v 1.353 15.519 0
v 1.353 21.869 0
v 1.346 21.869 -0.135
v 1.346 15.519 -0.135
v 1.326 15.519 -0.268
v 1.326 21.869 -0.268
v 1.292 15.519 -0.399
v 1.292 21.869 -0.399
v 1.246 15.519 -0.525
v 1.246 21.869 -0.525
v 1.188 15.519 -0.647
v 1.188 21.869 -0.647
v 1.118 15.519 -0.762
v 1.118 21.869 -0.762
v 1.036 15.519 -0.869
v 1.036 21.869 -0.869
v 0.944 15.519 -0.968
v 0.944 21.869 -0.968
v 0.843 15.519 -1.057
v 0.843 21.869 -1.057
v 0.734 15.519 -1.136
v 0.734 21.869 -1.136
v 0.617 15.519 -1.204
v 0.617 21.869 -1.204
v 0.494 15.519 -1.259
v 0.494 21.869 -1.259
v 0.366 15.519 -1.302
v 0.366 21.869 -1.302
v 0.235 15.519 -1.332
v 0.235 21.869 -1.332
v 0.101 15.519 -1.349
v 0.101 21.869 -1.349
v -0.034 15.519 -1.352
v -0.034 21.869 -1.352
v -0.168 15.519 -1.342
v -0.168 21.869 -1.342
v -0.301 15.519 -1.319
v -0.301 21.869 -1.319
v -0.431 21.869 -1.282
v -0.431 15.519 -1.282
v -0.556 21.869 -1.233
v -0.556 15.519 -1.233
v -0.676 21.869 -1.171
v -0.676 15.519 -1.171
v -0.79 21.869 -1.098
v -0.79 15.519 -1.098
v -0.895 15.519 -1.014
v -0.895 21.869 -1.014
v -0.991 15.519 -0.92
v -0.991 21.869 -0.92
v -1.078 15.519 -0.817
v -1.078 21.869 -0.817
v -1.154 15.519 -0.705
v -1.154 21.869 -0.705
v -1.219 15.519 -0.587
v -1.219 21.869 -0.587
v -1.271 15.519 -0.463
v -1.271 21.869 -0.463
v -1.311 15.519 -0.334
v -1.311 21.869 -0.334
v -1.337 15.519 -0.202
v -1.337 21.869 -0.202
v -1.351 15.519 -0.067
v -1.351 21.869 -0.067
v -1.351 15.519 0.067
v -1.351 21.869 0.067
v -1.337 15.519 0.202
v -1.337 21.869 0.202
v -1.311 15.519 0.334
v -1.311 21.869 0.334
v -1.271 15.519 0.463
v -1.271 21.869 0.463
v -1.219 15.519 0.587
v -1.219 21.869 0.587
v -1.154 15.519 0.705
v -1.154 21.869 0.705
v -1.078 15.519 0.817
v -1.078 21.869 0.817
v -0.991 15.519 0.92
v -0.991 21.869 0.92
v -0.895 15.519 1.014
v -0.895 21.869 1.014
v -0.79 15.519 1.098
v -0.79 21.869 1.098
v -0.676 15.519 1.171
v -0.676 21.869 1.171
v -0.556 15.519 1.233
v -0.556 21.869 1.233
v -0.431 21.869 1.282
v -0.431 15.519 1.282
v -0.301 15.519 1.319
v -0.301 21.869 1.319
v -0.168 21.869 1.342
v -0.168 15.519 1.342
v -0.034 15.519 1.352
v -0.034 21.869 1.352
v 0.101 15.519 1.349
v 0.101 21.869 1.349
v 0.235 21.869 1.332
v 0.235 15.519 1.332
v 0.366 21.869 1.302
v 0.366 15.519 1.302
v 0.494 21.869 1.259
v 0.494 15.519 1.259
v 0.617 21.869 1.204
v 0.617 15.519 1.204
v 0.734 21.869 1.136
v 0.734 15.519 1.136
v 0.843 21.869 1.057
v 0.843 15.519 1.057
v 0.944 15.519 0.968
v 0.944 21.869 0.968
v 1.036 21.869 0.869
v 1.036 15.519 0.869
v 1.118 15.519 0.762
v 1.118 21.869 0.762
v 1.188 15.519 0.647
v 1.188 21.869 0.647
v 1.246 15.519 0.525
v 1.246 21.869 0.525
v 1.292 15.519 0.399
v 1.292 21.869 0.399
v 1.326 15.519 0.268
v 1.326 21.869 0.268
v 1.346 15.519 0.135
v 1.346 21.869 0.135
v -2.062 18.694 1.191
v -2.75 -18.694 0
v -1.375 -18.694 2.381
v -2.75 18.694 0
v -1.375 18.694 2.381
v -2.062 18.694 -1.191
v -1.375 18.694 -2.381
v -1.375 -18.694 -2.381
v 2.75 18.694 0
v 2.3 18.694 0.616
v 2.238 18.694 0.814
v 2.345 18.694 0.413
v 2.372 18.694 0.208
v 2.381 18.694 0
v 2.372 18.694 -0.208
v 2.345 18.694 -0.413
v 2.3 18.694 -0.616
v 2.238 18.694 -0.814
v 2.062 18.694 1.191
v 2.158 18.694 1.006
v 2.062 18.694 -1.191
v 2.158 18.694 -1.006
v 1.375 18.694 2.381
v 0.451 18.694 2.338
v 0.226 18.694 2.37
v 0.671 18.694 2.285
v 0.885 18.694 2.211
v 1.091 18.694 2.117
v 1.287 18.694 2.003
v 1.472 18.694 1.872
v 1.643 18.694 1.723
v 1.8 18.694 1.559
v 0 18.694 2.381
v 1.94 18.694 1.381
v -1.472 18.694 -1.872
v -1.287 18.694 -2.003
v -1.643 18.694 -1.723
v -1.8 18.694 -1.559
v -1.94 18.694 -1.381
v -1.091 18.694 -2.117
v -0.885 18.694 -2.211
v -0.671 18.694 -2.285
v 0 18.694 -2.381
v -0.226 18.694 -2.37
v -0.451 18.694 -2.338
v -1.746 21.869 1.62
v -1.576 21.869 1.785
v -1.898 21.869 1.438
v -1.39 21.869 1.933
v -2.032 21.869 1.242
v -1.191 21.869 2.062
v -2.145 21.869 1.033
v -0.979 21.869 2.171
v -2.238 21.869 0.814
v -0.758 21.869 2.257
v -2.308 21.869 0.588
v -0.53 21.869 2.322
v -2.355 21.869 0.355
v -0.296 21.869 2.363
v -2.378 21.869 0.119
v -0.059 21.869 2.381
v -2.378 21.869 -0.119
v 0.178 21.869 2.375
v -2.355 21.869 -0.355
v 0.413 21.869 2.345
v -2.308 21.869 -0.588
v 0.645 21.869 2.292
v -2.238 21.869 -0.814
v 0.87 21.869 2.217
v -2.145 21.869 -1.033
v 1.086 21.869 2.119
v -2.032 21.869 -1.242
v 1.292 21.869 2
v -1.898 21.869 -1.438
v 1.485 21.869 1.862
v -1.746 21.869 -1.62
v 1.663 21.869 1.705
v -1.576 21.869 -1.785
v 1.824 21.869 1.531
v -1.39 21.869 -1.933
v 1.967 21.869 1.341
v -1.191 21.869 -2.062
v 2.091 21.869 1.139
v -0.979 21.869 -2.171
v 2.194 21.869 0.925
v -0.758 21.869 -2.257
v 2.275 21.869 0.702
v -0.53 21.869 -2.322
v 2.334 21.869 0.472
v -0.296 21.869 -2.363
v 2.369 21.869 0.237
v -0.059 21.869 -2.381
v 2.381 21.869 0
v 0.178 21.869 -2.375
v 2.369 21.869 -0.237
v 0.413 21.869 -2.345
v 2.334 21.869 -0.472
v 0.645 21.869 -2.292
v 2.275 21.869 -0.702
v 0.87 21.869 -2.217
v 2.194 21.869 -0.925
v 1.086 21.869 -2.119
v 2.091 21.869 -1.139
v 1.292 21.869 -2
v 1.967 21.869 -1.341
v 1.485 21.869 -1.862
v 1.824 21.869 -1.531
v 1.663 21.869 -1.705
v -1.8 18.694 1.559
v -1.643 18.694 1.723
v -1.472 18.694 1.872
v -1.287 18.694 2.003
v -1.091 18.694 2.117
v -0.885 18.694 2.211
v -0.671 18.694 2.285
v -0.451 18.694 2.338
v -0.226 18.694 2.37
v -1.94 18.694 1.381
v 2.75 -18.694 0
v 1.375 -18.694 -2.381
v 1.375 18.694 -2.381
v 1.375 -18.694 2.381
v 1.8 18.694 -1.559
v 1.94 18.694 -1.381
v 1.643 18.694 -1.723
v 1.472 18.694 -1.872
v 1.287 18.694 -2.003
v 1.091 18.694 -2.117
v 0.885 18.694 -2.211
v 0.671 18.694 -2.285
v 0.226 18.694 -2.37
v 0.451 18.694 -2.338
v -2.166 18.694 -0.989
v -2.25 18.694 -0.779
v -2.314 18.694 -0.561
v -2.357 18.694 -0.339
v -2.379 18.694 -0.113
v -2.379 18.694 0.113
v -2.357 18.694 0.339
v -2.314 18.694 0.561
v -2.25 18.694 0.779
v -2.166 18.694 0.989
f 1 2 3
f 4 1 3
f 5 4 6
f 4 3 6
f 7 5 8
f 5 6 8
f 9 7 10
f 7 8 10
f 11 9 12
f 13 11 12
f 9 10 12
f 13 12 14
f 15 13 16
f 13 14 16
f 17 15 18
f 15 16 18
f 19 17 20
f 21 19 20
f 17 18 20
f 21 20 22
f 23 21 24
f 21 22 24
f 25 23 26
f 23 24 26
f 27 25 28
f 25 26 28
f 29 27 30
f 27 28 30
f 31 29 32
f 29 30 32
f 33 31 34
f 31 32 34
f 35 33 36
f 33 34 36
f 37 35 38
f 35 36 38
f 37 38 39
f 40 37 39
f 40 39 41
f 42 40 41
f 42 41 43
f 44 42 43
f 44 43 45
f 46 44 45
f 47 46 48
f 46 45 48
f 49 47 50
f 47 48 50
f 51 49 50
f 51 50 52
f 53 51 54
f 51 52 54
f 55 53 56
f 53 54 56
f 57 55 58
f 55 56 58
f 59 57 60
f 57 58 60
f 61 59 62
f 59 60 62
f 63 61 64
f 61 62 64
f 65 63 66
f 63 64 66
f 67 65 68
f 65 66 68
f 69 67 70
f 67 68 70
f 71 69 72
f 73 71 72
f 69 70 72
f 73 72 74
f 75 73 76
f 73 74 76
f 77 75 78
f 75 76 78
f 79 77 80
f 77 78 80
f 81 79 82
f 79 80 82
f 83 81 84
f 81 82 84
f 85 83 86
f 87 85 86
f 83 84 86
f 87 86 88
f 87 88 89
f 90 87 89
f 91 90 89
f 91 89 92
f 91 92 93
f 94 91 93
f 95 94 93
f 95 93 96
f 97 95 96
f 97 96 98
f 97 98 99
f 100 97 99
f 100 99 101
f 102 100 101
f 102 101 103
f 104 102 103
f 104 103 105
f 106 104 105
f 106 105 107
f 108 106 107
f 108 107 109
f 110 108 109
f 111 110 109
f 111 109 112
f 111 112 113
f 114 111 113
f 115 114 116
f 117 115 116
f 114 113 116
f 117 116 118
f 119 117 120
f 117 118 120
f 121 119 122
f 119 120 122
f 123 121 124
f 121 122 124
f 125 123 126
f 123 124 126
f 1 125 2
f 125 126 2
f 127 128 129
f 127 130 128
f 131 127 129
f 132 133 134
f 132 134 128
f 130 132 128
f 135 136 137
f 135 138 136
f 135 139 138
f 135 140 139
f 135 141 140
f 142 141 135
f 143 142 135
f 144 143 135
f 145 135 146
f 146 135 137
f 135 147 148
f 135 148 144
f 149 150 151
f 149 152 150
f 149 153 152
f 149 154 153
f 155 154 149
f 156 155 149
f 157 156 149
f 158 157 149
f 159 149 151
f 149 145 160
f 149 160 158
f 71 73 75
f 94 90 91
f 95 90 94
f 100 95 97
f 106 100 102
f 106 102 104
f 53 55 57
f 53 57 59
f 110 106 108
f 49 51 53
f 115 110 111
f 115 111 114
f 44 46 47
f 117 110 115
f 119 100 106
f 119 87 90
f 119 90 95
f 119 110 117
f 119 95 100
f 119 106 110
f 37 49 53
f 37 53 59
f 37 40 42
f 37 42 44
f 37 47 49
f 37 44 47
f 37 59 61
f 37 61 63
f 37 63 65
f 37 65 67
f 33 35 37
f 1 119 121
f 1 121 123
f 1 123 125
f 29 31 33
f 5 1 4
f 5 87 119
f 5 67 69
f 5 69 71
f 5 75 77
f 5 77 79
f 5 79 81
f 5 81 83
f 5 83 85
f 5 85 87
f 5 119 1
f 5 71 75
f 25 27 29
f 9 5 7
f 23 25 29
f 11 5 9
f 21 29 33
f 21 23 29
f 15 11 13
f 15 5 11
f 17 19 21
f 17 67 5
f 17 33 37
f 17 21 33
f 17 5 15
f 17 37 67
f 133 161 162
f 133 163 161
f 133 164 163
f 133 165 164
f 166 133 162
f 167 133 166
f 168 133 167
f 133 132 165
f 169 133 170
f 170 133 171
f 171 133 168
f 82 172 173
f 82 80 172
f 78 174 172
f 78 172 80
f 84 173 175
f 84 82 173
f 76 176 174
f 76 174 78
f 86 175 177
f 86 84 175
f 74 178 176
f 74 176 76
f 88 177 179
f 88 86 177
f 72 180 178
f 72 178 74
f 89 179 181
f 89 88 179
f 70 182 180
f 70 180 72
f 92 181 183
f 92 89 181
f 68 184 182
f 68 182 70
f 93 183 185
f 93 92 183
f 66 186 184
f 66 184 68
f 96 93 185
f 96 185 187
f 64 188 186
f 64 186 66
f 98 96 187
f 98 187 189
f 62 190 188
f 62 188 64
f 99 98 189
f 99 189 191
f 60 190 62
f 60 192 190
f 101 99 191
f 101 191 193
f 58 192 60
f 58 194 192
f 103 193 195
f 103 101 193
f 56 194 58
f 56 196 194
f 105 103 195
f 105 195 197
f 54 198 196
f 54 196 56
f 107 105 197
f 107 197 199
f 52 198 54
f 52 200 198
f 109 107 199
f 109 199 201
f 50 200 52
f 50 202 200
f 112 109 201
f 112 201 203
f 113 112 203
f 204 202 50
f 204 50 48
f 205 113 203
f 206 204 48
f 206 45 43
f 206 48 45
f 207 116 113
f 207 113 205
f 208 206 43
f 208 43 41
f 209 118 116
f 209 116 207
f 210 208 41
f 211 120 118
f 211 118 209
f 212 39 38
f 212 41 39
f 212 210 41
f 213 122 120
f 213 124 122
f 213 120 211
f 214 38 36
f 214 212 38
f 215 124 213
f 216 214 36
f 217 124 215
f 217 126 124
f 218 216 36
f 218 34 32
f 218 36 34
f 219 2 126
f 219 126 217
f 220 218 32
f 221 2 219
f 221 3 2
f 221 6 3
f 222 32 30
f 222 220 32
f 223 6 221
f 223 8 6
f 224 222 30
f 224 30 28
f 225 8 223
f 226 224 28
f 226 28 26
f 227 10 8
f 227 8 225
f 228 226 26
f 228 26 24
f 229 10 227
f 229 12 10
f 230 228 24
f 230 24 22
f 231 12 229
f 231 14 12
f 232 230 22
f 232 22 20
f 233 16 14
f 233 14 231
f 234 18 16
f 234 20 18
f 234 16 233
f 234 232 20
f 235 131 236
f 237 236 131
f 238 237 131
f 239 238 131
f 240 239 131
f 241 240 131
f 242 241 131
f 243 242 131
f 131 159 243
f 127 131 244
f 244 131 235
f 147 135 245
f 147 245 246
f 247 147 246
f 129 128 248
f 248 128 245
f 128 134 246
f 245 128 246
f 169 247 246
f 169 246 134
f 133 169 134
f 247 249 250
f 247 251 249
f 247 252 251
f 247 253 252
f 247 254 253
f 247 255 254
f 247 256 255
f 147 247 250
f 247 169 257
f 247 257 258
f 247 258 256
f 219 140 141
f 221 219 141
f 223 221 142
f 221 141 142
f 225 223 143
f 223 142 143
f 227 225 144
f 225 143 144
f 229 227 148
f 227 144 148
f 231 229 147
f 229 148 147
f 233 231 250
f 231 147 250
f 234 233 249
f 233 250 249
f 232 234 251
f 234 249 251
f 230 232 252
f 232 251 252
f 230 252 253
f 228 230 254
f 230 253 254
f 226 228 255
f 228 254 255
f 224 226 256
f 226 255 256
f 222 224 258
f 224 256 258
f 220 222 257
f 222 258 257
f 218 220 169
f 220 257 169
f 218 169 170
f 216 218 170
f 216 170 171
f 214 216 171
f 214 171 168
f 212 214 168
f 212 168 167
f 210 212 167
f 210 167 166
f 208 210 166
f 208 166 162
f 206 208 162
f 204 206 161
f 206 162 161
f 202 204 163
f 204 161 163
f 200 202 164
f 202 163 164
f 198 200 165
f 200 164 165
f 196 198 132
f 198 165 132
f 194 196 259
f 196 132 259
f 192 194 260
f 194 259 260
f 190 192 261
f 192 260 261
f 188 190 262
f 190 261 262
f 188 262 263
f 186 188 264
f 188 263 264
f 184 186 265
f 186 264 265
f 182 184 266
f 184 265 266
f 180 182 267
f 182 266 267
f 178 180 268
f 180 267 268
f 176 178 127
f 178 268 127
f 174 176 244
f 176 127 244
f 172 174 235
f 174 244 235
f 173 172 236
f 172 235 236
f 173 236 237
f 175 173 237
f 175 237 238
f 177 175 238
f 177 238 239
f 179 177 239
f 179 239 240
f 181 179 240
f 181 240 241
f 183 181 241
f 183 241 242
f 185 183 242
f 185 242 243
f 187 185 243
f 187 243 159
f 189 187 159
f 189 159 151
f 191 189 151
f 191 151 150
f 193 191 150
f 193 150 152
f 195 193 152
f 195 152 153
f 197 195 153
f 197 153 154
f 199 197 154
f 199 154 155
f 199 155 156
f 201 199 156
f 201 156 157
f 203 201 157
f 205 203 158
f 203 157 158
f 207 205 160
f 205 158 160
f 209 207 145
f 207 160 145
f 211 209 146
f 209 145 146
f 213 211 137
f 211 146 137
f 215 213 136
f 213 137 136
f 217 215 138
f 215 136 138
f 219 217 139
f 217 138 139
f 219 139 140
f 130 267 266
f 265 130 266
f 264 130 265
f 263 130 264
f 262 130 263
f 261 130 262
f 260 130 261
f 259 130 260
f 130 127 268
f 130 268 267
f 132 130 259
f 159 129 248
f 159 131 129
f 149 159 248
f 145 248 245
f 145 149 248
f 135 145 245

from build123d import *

# Parameters (mm, degrees)
BOSS_EXTRUDE1_DEPTH = 18.6944
SKETCH2_R           = 2.38125
BOSS_EXTRUDE2_DEPTH = 3.175
SKETCH3_R           = 1.35255
CUT_EXTRUDE1_DEPTH  = 6.35


with BuildPart() as part:
    # Sketch1 → Boss-Extrude1 (new body, symmetric)
    with BuildSketch(Plane(origin=(0, 0, 0), x_dir=(1, 0, 0), z_dir=(0, 1, 0))):
        Polygon((1.374815329, -2.38125), (2.749630657, 0), (1.374815329, 2.38125), (-1.374815329, 2.38125), (-2.749630657, 0), (-1.374815329, -2.38125), align=None)
    extrude(amount=BOSS_EXTRUDE1_DEPTH, both=True)

    # Sketch2 → Boss-Extrude2 (add)
    with BuildSketch(Plane(origin=(0, 18.6944, 0), x_dir=(1, 0, 0), z_dir=(0, 1, 0))):
        Circle(SKETCH2_R)
    extrude(amount=BOSS_EXTRUDE2_DEPTH)

    # Sketch3 → Cut-Extrude1 (cut)
    with BuildSketch(Plane(origin=(0, 21.8694, 0), x_dir=(1, 0, 0), z_dir=(0, 1, 0))):
        Circle(SKETCH3_R)
    extrude(amount=-CUT_EXTRUDE1_DEPTH, mode=Mode.SUBTRACT)


solid = part.part
